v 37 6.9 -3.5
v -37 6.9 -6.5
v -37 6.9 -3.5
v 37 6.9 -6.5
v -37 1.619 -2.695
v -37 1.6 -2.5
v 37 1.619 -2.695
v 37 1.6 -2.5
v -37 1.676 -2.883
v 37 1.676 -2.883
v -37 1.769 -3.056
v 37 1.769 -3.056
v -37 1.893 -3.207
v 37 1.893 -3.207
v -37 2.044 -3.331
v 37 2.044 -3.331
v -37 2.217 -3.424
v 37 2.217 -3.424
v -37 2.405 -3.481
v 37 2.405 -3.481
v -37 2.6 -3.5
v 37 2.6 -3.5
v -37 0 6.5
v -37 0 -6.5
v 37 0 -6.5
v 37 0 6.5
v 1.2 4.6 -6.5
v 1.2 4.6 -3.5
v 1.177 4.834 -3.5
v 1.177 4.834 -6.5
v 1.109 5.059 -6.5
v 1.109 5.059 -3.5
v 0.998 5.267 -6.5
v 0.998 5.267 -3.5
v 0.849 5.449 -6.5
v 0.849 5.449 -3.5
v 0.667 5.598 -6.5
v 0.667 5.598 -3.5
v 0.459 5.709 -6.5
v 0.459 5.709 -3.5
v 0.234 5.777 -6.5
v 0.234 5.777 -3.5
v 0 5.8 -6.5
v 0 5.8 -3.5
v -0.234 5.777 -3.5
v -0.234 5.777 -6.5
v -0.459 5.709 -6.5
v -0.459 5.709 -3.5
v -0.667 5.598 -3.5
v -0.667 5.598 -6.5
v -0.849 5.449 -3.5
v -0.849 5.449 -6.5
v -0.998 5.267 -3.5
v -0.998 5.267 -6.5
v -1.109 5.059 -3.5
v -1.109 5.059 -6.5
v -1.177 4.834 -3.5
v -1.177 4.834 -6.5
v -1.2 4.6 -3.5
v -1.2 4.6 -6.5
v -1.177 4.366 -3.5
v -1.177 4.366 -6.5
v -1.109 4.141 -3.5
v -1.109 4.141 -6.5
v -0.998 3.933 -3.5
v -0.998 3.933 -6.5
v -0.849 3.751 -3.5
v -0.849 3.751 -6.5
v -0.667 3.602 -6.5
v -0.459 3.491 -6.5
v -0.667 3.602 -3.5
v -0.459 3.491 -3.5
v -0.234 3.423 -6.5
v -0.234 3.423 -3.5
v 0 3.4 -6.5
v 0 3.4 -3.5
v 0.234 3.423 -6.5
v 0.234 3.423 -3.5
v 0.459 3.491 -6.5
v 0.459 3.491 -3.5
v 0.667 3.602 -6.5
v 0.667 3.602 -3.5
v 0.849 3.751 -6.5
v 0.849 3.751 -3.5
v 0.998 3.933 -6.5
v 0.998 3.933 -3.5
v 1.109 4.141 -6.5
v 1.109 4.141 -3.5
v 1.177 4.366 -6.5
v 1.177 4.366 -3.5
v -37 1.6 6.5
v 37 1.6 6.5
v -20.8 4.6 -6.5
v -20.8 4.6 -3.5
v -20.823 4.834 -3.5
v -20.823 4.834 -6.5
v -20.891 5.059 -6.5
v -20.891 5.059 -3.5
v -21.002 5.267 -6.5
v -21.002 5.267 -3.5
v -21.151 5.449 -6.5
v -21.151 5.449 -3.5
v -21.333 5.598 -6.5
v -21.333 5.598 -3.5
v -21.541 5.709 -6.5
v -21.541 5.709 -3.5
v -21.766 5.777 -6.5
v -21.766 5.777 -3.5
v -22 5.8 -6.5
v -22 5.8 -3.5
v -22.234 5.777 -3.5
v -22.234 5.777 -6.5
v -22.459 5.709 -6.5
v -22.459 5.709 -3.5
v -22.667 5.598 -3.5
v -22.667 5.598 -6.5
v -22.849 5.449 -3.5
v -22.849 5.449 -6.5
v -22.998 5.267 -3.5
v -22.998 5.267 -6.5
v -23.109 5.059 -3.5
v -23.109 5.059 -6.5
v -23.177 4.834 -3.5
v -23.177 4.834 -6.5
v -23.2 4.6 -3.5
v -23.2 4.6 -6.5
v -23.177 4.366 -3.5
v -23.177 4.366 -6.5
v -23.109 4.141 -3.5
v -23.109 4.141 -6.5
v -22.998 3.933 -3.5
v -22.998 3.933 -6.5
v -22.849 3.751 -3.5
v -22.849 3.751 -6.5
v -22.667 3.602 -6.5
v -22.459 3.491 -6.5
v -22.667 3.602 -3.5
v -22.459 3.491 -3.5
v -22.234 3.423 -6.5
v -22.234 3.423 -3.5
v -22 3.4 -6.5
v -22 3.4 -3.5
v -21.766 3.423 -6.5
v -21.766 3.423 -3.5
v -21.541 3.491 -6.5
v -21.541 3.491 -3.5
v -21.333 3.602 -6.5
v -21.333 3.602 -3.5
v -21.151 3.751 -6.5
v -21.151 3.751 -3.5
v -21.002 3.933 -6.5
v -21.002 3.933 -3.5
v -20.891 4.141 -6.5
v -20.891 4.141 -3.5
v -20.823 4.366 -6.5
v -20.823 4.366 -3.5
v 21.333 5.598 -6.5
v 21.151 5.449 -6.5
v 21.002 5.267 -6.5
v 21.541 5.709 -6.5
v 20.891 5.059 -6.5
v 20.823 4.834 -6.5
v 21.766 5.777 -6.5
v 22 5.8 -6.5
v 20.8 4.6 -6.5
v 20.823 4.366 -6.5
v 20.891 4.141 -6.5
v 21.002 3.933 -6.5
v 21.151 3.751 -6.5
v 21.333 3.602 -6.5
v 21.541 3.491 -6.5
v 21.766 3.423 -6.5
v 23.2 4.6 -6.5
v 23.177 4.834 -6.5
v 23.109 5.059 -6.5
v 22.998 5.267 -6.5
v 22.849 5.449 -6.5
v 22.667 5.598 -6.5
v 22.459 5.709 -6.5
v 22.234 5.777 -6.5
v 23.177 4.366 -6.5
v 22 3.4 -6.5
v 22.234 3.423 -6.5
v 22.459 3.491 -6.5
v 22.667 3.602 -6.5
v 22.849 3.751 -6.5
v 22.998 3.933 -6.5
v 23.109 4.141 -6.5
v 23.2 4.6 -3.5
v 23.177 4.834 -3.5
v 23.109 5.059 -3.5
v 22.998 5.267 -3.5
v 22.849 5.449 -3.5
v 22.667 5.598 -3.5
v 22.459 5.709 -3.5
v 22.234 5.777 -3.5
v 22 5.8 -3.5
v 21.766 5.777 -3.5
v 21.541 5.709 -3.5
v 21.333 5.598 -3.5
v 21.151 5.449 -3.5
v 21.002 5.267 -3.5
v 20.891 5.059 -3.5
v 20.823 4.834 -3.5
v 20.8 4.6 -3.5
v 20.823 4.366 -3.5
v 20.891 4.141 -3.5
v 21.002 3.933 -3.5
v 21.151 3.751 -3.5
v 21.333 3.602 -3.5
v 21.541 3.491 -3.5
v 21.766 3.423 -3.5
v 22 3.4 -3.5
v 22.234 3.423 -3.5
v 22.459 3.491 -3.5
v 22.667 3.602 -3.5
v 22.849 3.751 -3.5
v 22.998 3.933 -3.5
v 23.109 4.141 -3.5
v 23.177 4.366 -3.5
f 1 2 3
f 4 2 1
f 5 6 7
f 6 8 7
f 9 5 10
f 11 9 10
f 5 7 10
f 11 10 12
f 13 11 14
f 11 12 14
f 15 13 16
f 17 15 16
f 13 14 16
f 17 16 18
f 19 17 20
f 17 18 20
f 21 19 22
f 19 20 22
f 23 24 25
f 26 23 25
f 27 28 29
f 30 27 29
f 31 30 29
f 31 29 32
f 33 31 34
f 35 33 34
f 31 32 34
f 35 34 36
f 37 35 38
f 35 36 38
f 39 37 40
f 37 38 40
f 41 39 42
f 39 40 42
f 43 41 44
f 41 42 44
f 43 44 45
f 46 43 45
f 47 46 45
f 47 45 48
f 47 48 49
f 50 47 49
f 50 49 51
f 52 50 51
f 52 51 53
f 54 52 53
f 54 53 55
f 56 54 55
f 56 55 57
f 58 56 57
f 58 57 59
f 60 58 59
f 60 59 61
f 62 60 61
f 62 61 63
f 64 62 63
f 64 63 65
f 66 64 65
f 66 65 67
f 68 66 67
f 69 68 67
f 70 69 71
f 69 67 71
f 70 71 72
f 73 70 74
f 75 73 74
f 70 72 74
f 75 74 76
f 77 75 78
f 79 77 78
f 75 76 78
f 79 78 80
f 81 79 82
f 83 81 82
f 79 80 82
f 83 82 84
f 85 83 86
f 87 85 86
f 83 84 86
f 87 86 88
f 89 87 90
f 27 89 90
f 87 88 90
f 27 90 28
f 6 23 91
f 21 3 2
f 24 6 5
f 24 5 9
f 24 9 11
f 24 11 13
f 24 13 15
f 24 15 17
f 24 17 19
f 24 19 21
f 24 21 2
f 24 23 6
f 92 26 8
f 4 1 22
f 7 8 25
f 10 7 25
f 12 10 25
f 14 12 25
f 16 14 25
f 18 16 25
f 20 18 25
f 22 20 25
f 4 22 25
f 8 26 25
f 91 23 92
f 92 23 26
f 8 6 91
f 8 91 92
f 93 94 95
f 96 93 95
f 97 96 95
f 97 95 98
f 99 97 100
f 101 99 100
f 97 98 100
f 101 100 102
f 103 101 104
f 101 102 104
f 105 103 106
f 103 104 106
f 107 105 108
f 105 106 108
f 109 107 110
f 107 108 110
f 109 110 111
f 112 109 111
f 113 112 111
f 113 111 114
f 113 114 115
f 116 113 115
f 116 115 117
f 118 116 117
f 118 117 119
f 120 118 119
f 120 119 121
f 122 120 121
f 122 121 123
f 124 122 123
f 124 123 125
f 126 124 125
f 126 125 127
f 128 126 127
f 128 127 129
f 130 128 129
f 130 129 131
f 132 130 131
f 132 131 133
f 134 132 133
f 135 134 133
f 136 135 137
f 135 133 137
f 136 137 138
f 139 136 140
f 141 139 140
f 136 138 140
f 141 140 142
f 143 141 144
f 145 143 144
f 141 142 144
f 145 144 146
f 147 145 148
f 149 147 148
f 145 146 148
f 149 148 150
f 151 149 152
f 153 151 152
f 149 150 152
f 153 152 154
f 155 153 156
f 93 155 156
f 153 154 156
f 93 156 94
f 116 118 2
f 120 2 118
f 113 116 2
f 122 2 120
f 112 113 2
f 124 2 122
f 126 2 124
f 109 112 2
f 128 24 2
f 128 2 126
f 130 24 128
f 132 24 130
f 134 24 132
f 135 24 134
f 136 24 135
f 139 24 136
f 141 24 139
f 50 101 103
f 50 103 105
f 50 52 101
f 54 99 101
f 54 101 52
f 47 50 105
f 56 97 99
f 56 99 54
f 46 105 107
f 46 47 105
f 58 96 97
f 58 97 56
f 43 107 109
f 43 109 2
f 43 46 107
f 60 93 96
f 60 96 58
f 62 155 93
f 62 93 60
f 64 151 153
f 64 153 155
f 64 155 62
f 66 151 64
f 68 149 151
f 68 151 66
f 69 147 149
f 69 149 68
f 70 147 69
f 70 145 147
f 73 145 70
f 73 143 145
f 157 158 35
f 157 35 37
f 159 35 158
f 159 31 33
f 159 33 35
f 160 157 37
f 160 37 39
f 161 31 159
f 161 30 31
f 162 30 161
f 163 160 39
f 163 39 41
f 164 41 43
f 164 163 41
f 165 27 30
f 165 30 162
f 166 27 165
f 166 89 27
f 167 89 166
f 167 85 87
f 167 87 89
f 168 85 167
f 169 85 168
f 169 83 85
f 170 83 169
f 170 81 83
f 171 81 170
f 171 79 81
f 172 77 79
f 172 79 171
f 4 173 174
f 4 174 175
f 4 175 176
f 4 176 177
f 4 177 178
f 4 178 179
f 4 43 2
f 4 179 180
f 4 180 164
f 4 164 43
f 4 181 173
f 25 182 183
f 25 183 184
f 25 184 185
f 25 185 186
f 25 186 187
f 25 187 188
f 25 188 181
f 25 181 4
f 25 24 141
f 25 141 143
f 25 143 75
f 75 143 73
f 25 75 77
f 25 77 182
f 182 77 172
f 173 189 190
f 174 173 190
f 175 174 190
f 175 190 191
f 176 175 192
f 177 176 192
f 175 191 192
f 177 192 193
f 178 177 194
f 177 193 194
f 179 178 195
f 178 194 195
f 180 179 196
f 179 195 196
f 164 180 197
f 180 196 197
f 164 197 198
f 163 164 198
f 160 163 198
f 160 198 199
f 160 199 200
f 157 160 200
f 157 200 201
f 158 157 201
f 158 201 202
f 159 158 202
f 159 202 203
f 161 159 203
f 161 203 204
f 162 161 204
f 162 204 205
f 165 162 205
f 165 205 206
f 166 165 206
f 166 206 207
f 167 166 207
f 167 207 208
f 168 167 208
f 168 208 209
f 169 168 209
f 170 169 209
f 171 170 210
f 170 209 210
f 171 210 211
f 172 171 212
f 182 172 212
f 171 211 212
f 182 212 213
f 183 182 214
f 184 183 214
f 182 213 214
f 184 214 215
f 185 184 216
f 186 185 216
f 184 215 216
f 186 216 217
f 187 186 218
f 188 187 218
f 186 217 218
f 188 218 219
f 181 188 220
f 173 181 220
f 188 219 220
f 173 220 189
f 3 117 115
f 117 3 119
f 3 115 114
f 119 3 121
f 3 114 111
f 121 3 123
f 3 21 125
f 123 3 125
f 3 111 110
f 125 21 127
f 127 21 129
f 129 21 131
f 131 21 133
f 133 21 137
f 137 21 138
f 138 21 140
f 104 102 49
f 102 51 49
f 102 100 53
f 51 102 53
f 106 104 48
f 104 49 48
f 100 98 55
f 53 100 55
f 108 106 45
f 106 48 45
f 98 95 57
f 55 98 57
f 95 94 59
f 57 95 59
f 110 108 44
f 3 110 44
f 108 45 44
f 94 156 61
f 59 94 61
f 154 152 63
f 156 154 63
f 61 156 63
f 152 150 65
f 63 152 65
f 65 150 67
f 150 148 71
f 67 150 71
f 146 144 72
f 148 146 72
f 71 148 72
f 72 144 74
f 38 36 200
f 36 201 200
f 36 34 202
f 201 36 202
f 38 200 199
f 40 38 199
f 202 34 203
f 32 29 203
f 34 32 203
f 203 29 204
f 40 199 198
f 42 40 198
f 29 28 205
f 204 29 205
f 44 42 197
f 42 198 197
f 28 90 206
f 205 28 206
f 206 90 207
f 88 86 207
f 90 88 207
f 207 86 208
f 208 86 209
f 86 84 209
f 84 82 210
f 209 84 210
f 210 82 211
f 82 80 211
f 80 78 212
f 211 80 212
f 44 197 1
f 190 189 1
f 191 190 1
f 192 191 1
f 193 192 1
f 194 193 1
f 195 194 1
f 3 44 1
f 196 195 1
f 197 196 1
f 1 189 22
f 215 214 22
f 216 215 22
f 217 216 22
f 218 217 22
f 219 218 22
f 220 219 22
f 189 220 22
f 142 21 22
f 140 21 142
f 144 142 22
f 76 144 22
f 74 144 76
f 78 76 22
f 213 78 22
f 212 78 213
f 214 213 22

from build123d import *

# Parameters (mm, degrees)
SKETCH1_W            = 74
SKETCH1_H            = 13
BOSS_EXTRUDE1_DEPTH  = 1.6
SKETCH2_W            = 74
SKETCH2_H            = 3
BOSS_EXTRUDE2_DEPTH  = 5.3
FILLET1_R            = 1
M2_CLEARANCE_HOLE1_D = 2.4


with BuildPart() as part:
    # Sketch1 → Boss-Extrude1 (new body)
    with BuildSketch(Plane(origin=(0, 0, 0), x_dir=(1, 0, 0), z_dir=(0, 1, 0))):
        Rectangle(SKETCH1_W, SKETCH1_H)
    extrude(amount=BOSS_EXTRUDE1_DEPTH)

    # Sketch2 → Boss-Extrude2 (add)
    with BuildSketch(Plane(origin=(0, 1.6, 0), x_dir=(1, 0, 0), z_dir=(0, 1, 0))):
        with Locations((0, 5)):
            Rectangle(SKETCH2_W, SKETCH2_H)
    extrude(amount=BOSS_EXTRUDE2_DEPTH)

    # Fillet1
    fillet1_edges = [part.edges().sort_by_distance(p)[0] for p in [
        (0, 1.6, -3.5),
    ]]
    fillet(fillet1_edges, radius=FILLET1_R)

    # M2 Clearance Hole1 (through all)
    with Locations(Plane(origin=(-22, 4.6, -6.5), x_dir=(-1, 0, 0), z_dir=(0, 0, -1))):
        with Locations((0, 0), (-22, 0), (-44, 0)):
            Hole(M2_CLEARANCE_HOLE1_D / 2)


solid = part.part
